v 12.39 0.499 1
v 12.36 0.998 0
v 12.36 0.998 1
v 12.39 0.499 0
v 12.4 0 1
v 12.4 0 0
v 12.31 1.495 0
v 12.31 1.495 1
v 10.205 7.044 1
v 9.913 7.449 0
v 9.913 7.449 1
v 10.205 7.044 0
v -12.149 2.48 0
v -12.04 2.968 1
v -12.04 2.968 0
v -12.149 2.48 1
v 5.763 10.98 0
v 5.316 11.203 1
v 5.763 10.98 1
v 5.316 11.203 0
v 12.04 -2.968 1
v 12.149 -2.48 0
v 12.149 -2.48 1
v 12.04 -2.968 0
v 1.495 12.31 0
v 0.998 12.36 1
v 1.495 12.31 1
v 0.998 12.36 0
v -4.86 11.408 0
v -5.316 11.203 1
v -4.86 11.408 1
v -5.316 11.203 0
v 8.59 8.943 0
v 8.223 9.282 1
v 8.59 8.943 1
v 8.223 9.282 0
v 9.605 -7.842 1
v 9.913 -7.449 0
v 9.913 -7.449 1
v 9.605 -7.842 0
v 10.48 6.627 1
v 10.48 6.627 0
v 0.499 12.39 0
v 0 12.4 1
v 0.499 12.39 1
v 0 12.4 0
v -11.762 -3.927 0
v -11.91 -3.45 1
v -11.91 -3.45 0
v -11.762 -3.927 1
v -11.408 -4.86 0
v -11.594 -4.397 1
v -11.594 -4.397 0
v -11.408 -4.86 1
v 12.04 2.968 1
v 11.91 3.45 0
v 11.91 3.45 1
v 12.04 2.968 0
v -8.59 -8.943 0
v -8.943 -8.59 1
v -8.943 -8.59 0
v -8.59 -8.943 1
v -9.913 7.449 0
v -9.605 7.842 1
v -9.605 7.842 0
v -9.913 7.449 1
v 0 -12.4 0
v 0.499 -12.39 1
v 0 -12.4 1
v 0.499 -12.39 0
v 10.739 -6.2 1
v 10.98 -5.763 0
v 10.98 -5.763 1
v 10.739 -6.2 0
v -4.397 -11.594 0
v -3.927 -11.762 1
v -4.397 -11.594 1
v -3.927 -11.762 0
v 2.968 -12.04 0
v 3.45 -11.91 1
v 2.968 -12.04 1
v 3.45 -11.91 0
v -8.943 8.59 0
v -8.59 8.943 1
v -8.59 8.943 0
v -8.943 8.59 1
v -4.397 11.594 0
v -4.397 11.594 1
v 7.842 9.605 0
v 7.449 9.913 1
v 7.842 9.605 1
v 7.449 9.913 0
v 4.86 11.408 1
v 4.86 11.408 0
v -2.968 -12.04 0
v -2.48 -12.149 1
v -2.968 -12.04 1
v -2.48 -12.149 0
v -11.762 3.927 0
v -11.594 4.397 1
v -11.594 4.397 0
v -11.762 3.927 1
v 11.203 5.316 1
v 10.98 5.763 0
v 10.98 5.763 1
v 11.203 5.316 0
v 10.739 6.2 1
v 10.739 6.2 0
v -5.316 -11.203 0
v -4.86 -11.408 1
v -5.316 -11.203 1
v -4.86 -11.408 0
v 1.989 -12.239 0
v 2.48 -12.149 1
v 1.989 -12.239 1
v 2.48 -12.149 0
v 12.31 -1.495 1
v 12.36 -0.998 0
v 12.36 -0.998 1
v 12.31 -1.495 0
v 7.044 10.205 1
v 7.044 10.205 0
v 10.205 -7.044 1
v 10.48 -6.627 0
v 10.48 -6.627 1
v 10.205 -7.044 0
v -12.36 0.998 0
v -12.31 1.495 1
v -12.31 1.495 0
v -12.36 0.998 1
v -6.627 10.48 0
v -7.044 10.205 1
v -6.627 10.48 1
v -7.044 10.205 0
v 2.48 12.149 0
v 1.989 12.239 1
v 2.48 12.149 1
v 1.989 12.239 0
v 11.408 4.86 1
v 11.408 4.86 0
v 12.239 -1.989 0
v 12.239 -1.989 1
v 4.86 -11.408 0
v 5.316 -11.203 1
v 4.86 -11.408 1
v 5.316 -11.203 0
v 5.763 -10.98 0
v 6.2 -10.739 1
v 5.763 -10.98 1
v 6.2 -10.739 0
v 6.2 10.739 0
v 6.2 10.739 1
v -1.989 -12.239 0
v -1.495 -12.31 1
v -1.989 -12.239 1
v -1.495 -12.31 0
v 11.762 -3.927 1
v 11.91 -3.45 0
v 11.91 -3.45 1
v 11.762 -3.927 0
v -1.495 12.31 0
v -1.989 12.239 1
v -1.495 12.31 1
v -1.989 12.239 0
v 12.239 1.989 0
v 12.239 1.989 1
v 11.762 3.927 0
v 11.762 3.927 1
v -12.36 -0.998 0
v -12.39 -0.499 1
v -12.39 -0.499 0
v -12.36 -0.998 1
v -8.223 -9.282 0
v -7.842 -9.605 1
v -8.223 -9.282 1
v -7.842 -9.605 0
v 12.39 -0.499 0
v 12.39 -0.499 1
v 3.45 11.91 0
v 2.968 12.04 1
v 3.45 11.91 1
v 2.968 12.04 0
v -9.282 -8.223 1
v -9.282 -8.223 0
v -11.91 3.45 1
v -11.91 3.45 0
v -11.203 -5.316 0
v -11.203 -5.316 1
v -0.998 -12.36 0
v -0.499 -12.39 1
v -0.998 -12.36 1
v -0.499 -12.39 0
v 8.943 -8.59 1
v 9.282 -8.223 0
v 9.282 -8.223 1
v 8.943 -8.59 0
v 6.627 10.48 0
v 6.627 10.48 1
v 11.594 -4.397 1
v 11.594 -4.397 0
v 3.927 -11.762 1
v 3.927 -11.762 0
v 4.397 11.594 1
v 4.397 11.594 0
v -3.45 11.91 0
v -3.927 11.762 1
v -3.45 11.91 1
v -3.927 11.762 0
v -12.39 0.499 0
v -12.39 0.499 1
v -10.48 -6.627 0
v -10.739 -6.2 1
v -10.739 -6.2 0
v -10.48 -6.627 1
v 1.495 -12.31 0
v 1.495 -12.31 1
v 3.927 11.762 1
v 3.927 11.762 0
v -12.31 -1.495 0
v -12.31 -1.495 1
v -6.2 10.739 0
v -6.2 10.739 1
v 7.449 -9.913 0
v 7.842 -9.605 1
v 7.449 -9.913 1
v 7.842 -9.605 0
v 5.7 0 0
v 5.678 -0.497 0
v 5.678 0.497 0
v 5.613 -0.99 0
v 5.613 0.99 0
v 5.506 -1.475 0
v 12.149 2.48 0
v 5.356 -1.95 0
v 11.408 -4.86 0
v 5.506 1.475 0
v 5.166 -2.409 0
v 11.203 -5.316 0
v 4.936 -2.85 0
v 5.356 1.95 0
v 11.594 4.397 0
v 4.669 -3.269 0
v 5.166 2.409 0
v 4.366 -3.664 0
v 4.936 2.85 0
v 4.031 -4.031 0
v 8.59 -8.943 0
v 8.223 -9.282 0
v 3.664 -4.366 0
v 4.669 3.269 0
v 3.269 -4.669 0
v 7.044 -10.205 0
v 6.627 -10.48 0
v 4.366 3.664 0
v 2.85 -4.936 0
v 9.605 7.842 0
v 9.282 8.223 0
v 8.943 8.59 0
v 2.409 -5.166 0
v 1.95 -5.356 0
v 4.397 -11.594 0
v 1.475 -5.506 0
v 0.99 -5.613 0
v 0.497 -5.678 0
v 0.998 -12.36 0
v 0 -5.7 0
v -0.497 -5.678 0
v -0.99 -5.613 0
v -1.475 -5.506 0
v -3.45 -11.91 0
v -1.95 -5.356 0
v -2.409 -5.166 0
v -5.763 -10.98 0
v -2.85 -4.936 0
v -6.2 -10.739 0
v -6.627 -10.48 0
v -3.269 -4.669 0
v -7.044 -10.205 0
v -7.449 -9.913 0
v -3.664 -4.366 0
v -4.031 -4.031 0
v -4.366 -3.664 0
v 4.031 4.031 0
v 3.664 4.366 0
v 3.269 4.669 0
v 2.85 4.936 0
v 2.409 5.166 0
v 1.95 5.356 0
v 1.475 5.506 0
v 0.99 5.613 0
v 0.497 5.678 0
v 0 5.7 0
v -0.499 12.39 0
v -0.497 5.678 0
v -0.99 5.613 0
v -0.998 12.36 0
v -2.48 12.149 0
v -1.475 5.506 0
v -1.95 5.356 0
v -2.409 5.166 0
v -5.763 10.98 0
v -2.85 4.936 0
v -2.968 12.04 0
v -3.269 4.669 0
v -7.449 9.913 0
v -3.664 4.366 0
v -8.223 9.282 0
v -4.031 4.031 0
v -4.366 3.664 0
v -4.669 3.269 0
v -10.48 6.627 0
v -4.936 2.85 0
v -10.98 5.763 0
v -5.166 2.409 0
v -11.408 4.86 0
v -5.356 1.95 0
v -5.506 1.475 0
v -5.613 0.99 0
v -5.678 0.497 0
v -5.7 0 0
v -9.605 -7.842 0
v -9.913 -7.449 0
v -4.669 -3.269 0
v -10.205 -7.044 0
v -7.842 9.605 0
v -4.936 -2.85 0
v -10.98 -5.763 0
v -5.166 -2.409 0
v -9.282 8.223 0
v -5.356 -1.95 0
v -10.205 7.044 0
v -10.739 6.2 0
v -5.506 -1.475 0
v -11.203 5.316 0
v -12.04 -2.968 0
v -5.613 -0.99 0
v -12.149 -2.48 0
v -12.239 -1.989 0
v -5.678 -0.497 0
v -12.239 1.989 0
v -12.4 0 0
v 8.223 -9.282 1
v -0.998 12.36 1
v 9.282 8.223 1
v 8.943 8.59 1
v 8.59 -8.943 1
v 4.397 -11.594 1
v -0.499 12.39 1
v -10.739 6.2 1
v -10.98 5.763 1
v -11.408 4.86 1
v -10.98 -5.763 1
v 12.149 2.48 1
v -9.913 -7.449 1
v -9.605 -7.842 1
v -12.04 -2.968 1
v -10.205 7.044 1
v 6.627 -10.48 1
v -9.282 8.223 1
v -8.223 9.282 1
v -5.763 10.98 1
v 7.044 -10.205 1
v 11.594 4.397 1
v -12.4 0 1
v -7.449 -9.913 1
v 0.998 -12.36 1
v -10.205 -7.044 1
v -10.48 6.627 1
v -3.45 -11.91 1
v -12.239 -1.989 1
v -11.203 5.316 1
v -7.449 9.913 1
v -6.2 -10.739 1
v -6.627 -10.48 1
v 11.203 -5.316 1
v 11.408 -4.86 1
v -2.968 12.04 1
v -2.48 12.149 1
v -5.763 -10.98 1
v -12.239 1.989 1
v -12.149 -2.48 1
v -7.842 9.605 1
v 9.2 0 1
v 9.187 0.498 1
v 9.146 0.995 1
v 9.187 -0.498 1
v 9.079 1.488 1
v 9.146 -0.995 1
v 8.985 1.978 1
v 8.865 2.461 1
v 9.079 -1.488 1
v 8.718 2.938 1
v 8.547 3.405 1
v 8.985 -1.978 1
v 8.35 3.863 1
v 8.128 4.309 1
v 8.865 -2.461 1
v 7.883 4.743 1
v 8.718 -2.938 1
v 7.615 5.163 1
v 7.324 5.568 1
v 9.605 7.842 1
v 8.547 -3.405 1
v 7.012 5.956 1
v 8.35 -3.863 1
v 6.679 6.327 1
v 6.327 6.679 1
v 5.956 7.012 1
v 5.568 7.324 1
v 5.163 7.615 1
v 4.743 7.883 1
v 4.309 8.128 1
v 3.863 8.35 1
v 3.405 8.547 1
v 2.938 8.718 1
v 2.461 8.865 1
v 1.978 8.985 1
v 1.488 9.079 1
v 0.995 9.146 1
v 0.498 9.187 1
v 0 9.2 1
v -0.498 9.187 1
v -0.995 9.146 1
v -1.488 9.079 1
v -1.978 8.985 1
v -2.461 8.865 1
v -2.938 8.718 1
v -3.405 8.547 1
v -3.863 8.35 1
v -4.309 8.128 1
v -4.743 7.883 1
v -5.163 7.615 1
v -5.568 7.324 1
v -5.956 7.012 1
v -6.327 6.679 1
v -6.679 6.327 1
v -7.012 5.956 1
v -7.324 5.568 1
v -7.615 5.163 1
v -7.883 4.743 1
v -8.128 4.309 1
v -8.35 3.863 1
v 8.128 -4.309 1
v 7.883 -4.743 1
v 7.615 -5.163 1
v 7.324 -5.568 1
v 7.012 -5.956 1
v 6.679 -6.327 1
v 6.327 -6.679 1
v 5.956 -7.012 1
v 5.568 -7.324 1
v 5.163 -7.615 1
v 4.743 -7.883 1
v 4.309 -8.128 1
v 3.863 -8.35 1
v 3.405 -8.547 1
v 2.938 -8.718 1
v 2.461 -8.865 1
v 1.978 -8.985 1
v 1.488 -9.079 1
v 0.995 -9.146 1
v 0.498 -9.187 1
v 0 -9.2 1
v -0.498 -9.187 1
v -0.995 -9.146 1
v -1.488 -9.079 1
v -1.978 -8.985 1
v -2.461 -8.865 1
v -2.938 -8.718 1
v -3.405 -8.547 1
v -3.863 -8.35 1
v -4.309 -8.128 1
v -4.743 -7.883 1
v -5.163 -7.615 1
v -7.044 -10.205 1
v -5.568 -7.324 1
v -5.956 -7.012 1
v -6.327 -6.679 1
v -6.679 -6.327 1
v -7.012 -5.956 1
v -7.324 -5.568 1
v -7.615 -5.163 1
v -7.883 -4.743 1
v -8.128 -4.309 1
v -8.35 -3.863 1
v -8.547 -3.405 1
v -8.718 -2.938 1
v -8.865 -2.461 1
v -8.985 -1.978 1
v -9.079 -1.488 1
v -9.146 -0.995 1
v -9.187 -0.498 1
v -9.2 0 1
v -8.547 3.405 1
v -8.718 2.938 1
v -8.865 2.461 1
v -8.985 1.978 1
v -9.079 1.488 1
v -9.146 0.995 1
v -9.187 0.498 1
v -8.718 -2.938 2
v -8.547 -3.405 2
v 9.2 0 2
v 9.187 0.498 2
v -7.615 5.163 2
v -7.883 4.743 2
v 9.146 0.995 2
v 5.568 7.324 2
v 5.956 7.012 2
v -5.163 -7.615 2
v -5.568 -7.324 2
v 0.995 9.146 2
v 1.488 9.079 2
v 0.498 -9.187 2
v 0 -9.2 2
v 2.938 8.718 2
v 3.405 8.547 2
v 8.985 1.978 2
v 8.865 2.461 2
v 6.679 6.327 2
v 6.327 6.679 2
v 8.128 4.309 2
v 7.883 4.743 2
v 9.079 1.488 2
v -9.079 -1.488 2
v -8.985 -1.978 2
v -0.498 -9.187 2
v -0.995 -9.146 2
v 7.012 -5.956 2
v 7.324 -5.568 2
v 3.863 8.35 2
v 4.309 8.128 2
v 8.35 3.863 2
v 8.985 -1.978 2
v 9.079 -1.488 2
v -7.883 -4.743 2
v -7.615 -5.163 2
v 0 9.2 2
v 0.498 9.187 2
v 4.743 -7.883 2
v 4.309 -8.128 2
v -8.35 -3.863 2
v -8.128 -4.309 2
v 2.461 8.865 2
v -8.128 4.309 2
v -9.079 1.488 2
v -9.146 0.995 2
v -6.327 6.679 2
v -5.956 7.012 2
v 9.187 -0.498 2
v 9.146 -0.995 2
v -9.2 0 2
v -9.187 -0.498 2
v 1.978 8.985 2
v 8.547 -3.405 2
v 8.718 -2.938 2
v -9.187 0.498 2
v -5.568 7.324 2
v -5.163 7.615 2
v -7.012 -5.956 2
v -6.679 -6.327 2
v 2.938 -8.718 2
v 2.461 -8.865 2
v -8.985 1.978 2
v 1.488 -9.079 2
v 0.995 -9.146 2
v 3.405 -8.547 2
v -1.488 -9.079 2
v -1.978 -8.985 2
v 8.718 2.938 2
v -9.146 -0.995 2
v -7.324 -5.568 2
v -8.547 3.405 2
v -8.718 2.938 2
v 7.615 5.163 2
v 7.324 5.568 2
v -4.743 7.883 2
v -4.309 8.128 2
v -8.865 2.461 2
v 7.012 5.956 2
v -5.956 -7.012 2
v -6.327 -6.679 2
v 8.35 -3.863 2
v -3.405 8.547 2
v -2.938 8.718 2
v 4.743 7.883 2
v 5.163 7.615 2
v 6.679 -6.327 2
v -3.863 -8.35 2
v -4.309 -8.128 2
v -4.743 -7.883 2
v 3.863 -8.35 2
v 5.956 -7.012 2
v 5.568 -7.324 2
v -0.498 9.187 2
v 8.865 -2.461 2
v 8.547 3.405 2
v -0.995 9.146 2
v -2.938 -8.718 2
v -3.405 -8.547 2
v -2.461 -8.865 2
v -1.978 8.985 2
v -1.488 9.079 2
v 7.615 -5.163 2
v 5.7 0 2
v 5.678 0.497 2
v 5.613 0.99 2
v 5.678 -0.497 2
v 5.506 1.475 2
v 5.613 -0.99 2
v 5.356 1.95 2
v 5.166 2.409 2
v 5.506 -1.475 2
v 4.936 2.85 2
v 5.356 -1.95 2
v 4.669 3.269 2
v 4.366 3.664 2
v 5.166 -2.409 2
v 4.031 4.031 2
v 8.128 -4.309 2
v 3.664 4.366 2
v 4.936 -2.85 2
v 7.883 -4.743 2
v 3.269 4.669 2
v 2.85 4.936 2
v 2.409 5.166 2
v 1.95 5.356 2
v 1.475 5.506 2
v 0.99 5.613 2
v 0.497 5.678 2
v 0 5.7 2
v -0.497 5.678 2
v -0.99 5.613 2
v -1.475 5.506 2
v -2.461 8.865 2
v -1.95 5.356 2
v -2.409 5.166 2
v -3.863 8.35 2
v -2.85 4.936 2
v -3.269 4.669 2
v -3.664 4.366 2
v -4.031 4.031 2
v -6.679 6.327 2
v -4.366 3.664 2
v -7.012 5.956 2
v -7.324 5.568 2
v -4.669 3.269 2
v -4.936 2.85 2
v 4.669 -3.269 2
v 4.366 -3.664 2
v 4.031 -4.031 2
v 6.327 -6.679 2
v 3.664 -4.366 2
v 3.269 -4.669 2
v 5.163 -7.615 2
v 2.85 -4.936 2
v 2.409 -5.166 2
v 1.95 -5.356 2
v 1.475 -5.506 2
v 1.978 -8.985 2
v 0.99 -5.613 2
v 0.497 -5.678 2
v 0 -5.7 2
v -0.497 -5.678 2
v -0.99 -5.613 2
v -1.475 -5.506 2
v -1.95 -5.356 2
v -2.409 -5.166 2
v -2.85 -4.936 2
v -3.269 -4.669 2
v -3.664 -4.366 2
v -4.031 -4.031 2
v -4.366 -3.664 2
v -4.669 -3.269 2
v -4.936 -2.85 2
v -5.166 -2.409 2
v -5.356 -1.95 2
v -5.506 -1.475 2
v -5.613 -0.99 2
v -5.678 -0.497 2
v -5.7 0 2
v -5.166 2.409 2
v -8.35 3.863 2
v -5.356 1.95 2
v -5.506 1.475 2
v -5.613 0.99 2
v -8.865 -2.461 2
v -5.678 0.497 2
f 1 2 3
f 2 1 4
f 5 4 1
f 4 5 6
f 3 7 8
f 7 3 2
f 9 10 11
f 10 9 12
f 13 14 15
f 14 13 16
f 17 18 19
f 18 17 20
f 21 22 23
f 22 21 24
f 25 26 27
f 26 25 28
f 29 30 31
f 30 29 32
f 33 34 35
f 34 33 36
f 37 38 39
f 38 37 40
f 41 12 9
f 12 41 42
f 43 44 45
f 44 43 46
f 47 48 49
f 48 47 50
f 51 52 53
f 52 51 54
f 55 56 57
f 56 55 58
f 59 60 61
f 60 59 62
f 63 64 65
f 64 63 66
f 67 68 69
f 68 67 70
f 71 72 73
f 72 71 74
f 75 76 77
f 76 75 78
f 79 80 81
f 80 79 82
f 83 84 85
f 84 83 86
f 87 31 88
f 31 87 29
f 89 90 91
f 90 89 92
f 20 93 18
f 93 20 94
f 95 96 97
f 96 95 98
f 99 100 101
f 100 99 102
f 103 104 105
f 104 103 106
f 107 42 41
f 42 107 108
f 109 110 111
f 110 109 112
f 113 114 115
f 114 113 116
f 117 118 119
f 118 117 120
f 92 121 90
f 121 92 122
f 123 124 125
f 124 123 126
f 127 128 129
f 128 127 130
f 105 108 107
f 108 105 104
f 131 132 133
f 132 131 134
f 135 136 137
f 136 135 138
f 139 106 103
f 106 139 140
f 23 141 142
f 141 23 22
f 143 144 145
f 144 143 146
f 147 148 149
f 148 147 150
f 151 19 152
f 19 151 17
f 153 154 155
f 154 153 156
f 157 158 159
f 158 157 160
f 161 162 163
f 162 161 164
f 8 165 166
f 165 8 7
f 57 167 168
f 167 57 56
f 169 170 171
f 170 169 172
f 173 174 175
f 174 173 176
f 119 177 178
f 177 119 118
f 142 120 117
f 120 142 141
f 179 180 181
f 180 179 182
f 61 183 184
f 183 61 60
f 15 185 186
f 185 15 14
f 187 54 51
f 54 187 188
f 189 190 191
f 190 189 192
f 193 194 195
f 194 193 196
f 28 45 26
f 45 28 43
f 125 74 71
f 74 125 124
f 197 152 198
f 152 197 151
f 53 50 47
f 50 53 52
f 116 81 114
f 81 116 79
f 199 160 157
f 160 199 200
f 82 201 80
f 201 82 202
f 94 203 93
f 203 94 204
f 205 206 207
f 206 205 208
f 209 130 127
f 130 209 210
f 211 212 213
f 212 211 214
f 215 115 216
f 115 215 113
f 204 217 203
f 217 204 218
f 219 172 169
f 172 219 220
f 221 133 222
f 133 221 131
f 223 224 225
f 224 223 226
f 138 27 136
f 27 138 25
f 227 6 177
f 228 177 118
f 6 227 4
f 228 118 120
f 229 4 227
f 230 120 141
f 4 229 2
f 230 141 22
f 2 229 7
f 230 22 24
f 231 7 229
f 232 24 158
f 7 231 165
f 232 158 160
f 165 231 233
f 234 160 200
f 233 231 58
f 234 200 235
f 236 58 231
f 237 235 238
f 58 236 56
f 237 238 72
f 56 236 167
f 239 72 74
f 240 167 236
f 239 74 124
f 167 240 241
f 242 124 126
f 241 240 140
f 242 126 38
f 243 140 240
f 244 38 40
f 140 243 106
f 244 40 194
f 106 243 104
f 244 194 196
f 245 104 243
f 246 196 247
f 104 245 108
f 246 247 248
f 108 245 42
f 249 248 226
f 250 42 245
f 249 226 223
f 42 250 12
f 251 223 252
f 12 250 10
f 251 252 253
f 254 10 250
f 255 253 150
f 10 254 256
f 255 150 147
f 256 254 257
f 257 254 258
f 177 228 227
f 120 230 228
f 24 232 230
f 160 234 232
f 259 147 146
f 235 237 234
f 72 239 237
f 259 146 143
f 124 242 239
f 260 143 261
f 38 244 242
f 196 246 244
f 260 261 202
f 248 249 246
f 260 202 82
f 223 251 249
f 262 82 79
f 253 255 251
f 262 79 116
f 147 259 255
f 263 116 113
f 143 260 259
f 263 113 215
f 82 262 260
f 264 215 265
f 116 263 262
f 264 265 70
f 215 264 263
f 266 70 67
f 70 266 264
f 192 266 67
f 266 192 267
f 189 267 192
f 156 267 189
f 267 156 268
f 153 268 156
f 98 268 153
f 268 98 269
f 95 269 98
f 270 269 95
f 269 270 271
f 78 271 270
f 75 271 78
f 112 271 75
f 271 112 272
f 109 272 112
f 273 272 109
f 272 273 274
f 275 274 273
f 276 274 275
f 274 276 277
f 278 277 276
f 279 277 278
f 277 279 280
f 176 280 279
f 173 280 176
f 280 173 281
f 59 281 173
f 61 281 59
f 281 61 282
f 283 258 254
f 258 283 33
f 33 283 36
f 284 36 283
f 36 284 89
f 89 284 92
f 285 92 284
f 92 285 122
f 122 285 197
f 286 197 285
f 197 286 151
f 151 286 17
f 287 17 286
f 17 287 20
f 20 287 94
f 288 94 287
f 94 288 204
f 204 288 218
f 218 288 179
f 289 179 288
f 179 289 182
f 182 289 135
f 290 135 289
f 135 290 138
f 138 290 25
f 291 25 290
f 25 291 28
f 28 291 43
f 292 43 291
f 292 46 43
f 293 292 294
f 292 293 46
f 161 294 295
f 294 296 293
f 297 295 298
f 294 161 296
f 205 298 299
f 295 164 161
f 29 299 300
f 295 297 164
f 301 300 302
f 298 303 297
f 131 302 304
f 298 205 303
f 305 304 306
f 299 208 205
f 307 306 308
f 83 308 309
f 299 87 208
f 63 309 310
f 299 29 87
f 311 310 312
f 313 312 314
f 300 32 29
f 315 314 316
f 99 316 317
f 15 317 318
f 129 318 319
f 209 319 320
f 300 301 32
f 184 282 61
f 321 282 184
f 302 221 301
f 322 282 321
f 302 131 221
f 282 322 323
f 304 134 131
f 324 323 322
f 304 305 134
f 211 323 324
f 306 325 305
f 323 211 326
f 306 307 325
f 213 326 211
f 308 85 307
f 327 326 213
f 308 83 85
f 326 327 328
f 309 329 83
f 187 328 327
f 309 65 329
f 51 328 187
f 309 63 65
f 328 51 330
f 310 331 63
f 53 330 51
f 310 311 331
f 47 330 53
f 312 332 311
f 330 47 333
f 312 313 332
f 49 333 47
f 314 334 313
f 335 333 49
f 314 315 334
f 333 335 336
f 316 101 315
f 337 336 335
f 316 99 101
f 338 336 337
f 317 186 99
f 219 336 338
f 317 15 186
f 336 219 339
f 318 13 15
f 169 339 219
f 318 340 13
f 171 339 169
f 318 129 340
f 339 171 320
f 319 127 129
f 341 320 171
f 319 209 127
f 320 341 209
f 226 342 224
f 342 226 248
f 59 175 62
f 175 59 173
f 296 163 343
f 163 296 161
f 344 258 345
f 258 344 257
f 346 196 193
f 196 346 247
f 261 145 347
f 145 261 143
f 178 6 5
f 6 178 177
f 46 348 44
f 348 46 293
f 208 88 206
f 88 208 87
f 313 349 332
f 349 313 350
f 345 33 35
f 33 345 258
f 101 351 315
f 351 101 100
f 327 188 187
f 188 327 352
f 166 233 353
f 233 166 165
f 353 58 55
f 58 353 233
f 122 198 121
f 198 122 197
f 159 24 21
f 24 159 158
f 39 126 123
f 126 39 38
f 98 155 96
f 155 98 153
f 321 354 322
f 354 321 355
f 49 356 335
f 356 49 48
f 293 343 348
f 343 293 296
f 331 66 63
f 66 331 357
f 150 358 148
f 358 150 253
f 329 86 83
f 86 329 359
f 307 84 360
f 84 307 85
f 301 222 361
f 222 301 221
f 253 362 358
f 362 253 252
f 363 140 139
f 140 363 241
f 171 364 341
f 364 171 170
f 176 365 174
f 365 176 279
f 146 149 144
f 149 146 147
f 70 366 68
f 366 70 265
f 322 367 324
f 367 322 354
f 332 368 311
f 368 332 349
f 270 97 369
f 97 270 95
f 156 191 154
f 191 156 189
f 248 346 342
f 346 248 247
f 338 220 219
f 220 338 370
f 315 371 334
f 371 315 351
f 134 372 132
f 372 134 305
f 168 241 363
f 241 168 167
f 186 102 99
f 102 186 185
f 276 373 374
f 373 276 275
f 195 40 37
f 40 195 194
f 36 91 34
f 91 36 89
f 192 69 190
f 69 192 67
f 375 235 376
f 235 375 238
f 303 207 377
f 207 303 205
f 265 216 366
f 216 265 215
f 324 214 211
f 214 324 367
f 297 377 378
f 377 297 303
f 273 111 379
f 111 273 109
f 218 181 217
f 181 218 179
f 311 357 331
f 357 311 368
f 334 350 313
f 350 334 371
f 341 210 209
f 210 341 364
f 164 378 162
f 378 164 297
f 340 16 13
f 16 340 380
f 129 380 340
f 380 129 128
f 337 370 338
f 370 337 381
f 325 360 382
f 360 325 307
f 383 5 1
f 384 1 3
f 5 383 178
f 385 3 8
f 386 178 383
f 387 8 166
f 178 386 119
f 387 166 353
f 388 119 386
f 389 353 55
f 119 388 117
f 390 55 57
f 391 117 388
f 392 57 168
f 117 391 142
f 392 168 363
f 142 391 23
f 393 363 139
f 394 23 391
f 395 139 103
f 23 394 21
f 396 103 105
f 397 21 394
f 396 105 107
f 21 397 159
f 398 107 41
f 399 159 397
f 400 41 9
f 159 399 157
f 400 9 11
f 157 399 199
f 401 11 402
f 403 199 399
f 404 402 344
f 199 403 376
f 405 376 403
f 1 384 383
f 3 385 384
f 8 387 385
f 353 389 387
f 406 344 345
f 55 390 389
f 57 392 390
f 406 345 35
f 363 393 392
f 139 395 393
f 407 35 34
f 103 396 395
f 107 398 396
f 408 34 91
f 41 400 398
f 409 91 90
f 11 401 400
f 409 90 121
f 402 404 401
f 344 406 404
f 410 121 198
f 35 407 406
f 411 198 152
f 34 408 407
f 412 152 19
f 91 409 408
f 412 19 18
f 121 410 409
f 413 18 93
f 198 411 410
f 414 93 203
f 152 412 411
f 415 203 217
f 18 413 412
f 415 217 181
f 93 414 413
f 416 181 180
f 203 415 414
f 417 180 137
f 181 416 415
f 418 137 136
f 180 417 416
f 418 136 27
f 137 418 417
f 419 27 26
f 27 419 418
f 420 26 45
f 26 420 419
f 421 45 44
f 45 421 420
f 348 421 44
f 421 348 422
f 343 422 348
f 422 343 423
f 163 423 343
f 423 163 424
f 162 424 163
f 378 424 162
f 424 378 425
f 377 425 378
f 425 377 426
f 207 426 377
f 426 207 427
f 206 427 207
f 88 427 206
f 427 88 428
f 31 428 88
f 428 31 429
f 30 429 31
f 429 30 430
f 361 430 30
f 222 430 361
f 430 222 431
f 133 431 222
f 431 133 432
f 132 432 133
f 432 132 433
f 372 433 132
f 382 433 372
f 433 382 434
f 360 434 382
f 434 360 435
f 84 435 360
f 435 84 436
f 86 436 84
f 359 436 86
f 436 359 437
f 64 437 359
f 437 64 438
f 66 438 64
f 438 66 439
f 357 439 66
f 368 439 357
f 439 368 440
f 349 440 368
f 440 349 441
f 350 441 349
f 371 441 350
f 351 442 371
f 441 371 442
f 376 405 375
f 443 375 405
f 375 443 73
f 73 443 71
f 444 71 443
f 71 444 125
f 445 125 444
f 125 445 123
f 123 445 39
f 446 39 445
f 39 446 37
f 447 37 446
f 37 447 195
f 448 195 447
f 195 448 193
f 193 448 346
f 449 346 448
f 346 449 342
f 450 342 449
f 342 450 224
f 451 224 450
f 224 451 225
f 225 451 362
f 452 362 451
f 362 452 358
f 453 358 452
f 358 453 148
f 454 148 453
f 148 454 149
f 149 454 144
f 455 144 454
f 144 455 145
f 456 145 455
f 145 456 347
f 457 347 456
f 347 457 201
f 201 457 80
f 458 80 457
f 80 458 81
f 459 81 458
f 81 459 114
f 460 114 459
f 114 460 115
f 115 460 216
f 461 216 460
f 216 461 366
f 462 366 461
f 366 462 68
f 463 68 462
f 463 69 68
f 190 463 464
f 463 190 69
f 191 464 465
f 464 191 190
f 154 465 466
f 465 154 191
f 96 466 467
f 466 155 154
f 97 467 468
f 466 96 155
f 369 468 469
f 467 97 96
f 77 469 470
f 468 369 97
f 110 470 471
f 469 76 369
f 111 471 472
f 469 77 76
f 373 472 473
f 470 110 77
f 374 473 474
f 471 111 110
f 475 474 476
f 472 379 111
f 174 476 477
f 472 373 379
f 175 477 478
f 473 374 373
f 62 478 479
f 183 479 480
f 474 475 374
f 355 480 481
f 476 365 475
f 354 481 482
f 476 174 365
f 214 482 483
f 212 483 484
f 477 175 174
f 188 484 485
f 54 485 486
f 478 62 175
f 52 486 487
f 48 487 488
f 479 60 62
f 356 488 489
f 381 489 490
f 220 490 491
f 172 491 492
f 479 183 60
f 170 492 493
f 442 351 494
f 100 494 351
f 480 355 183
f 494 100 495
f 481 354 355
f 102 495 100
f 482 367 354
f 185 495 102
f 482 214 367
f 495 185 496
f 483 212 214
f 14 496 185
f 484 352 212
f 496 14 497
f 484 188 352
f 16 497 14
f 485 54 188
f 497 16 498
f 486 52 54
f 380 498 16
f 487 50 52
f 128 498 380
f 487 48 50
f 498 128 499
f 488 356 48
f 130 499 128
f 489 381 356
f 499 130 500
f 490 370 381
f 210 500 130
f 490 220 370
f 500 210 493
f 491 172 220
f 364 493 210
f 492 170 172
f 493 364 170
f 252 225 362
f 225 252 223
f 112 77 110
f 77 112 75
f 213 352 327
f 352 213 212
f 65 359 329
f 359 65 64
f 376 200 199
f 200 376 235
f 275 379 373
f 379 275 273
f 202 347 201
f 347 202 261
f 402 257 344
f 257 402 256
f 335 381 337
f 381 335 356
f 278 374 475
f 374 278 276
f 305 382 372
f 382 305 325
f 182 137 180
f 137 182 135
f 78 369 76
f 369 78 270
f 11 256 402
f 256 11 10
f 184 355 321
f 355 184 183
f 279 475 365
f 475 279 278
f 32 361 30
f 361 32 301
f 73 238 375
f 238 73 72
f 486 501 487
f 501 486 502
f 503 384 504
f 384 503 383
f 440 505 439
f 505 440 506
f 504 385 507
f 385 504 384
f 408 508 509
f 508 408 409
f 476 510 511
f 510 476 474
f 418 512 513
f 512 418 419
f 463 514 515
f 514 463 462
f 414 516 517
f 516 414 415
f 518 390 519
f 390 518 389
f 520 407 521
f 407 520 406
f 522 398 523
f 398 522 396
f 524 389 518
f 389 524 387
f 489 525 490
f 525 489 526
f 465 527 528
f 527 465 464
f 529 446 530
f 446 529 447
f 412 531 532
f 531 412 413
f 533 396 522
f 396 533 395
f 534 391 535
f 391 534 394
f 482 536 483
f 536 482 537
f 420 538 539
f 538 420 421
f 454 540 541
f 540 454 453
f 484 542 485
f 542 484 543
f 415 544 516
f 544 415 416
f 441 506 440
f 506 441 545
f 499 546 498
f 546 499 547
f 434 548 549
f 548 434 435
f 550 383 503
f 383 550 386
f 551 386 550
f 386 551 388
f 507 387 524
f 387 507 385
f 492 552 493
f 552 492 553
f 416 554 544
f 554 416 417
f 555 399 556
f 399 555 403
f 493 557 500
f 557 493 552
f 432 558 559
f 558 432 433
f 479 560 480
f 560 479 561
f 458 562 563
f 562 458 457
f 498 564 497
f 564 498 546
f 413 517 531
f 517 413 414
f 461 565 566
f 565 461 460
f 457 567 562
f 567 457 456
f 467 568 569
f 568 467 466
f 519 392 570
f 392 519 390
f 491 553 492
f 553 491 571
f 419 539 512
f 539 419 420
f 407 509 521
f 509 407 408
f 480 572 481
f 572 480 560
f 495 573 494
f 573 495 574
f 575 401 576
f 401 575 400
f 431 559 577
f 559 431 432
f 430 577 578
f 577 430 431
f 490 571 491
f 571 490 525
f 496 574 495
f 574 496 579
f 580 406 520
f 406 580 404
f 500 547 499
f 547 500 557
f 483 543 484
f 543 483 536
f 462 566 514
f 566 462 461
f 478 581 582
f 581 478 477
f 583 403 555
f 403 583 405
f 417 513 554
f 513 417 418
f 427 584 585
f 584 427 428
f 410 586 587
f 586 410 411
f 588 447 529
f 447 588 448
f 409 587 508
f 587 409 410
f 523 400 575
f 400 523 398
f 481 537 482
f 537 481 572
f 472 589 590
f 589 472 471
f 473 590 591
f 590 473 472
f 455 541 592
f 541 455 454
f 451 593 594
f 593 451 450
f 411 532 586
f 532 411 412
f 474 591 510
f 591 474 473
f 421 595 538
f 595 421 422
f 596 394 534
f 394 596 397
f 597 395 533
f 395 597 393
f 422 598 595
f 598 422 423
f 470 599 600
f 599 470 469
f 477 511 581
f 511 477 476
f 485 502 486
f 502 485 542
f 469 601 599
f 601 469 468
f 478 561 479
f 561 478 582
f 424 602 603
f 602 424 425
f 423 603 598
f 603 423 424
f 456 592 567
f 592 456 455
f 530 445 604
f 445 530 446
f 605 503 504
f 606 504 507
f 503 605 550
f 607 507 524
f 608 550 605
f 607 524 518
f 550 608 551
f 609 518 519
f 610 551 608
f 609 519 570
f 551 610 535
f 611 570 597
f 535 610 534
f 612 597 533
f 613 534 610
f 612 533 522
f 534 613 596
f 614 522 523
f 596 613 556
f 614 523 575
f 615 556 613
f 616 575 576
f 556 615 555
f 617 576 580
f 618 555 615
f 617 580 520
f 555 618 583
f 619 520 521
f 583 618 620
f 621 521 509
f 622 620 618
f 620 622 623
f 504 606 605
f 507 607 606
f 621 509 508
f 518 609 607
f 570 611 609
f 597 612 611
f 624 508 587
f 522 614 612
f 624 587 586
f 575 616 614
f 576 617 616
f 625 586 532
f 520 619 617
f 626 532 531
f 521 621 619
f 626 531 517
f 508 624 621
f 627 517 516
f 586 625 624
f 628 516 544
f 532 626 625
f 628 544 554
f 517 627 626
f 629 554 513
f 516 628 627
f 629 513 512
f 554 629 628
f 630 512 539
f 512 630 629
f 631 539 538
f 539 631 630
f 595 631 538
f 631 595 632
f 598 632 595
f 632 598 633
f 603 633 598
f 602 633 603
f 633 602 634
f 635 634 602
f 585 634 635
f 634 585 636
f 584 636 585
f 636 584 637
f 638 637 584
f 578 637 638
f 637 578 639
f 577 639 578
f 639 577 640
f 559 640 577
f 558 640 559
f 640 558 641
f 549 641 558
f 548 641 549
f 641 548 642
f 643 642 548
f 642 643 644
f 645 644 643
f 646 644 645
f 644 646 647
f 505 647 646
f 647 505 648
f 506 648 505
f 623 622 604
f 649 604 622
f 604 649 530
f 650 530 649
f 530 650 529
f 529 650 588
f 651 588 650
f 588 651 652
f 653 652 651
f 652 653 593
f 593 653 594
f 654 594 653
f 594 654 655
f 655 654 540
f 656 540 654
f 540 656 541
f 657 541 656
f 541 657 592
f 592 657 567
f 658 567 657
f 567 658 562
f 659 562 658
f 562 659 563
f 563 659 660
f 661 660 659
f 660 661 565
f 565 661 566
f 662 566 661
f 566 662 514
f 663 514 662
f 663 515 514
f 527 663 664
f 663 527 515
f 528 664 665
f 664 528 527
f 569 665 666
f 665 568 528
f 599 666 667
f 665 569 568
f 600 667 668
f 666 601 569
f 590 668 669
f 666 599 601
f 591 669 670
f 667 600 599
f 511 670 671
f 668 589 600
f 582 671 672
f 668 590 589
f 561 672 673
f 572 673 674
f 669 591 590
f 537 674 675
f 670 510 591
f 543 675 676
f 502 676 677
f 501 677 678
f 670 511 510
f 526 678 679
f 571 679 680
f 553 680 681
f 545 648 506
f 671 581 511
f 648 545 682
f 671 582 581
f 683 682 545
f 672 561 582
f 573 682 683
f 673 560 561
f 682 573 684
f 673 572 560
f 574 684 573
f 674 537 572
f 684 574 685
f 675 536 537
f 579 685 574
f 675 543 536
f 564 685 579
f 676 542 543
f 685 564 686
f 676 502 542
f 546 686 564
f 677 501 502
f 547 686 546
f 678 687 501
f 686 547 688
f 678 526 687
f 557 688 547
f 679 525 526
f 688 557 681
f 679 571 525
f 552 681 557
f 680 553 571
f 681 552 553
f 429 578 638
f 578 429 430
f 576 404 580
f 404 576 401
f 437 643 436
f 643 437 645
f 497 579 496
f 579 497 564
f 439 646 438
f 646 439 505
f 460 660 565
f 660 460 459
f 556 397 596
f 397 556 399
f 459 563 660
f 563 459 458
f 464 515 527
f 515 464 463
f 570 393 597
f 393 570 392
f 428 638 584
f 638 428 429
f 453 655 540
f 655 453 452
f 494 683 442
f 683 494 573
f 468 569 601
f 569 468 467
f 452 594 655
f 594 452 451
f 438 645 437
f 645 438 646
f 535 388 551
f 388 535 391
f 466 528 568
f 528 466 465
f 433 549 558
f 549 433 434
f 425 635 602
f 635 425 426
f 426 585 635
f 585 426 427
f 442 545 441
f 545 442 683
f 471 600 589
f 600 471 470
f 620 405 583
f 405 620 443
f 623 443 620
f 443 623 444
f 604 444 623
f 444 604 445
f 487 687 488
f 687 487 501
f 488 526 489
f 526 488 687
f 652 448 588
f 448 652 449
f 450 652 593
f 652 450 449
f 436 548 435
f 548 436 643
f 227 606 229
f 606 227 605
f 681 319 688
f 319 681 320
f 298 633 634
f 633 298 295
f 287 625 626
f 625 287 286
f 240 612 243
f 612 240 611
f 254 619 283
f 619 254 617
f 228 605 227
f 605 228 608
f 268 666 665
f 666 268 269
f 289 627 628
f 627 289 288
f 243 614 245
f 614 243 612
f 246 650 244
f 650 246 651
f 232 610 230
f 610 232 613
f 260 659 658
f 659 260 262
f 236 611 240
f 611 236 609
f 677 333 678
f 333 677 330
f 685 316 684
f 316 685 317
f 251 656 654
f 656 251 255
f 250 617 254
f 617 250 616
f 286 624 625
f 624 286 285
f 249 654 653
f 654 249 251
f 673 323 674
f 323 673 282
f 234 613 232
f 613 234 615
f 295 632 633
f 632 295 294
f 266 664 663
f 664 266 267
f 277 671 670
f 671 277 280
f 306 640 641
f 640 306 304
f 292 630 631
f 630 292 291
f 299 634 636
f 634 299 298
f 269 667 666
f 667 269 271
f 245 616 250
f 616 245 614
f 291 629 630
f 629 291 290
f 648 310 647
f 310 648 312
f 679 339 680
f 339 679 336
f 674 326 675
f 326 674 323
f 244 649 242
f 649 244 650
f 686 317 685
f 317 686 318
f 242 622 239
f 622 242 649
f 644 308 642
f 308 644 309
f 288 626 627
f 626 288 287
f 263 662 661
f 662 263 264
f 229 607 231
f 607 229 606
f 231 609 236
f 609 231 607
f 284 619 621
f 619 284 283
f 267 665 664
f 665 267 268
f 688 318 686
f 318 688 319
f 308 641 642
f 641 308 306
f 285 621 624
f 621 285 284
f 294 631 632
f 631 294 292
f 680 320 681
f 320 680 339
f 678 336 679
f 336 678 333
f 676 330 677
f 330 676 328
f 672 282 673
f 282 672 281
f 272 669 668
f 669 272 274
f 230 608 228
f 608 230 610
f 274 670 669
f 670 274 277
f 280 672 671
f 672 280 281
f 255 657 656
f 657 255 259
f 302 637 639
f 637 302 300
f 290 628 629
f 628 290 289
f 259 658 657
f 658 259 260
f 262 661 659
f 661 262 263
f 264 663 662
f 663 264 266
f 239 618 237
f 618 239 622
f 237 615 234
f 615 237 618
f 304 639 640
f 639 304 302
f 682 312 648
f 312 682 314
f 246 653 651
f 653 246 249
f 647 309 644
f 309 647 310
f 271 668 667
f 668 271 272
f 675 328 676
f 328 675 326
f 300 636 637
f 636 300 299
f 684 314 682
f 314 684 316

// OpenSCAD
//rendering config
$fa=0.5; // default minimum facet angle is now 0.5
$fs=0.5; // default minimum facet size is now 0.5 mm

wallThickness = 2;
jackHole = 9.4;
washerR = jackHole + 3;
washerInnerR = jackHole - 0.2;
properJackHole = 5.7;
outerWasherThickness = 1;

difference() {
    union() {
        cylinder(r=washerR, h=outerWasherThickness);
        translate([0, 0, outerWasherThickness])
        cylinder(r=washerInnerR, h=wallThickness/2);
    }
    
    translate([0, 0, -1])
    cylinder(r=properJackHole, h=wallThickness + 2);
}
